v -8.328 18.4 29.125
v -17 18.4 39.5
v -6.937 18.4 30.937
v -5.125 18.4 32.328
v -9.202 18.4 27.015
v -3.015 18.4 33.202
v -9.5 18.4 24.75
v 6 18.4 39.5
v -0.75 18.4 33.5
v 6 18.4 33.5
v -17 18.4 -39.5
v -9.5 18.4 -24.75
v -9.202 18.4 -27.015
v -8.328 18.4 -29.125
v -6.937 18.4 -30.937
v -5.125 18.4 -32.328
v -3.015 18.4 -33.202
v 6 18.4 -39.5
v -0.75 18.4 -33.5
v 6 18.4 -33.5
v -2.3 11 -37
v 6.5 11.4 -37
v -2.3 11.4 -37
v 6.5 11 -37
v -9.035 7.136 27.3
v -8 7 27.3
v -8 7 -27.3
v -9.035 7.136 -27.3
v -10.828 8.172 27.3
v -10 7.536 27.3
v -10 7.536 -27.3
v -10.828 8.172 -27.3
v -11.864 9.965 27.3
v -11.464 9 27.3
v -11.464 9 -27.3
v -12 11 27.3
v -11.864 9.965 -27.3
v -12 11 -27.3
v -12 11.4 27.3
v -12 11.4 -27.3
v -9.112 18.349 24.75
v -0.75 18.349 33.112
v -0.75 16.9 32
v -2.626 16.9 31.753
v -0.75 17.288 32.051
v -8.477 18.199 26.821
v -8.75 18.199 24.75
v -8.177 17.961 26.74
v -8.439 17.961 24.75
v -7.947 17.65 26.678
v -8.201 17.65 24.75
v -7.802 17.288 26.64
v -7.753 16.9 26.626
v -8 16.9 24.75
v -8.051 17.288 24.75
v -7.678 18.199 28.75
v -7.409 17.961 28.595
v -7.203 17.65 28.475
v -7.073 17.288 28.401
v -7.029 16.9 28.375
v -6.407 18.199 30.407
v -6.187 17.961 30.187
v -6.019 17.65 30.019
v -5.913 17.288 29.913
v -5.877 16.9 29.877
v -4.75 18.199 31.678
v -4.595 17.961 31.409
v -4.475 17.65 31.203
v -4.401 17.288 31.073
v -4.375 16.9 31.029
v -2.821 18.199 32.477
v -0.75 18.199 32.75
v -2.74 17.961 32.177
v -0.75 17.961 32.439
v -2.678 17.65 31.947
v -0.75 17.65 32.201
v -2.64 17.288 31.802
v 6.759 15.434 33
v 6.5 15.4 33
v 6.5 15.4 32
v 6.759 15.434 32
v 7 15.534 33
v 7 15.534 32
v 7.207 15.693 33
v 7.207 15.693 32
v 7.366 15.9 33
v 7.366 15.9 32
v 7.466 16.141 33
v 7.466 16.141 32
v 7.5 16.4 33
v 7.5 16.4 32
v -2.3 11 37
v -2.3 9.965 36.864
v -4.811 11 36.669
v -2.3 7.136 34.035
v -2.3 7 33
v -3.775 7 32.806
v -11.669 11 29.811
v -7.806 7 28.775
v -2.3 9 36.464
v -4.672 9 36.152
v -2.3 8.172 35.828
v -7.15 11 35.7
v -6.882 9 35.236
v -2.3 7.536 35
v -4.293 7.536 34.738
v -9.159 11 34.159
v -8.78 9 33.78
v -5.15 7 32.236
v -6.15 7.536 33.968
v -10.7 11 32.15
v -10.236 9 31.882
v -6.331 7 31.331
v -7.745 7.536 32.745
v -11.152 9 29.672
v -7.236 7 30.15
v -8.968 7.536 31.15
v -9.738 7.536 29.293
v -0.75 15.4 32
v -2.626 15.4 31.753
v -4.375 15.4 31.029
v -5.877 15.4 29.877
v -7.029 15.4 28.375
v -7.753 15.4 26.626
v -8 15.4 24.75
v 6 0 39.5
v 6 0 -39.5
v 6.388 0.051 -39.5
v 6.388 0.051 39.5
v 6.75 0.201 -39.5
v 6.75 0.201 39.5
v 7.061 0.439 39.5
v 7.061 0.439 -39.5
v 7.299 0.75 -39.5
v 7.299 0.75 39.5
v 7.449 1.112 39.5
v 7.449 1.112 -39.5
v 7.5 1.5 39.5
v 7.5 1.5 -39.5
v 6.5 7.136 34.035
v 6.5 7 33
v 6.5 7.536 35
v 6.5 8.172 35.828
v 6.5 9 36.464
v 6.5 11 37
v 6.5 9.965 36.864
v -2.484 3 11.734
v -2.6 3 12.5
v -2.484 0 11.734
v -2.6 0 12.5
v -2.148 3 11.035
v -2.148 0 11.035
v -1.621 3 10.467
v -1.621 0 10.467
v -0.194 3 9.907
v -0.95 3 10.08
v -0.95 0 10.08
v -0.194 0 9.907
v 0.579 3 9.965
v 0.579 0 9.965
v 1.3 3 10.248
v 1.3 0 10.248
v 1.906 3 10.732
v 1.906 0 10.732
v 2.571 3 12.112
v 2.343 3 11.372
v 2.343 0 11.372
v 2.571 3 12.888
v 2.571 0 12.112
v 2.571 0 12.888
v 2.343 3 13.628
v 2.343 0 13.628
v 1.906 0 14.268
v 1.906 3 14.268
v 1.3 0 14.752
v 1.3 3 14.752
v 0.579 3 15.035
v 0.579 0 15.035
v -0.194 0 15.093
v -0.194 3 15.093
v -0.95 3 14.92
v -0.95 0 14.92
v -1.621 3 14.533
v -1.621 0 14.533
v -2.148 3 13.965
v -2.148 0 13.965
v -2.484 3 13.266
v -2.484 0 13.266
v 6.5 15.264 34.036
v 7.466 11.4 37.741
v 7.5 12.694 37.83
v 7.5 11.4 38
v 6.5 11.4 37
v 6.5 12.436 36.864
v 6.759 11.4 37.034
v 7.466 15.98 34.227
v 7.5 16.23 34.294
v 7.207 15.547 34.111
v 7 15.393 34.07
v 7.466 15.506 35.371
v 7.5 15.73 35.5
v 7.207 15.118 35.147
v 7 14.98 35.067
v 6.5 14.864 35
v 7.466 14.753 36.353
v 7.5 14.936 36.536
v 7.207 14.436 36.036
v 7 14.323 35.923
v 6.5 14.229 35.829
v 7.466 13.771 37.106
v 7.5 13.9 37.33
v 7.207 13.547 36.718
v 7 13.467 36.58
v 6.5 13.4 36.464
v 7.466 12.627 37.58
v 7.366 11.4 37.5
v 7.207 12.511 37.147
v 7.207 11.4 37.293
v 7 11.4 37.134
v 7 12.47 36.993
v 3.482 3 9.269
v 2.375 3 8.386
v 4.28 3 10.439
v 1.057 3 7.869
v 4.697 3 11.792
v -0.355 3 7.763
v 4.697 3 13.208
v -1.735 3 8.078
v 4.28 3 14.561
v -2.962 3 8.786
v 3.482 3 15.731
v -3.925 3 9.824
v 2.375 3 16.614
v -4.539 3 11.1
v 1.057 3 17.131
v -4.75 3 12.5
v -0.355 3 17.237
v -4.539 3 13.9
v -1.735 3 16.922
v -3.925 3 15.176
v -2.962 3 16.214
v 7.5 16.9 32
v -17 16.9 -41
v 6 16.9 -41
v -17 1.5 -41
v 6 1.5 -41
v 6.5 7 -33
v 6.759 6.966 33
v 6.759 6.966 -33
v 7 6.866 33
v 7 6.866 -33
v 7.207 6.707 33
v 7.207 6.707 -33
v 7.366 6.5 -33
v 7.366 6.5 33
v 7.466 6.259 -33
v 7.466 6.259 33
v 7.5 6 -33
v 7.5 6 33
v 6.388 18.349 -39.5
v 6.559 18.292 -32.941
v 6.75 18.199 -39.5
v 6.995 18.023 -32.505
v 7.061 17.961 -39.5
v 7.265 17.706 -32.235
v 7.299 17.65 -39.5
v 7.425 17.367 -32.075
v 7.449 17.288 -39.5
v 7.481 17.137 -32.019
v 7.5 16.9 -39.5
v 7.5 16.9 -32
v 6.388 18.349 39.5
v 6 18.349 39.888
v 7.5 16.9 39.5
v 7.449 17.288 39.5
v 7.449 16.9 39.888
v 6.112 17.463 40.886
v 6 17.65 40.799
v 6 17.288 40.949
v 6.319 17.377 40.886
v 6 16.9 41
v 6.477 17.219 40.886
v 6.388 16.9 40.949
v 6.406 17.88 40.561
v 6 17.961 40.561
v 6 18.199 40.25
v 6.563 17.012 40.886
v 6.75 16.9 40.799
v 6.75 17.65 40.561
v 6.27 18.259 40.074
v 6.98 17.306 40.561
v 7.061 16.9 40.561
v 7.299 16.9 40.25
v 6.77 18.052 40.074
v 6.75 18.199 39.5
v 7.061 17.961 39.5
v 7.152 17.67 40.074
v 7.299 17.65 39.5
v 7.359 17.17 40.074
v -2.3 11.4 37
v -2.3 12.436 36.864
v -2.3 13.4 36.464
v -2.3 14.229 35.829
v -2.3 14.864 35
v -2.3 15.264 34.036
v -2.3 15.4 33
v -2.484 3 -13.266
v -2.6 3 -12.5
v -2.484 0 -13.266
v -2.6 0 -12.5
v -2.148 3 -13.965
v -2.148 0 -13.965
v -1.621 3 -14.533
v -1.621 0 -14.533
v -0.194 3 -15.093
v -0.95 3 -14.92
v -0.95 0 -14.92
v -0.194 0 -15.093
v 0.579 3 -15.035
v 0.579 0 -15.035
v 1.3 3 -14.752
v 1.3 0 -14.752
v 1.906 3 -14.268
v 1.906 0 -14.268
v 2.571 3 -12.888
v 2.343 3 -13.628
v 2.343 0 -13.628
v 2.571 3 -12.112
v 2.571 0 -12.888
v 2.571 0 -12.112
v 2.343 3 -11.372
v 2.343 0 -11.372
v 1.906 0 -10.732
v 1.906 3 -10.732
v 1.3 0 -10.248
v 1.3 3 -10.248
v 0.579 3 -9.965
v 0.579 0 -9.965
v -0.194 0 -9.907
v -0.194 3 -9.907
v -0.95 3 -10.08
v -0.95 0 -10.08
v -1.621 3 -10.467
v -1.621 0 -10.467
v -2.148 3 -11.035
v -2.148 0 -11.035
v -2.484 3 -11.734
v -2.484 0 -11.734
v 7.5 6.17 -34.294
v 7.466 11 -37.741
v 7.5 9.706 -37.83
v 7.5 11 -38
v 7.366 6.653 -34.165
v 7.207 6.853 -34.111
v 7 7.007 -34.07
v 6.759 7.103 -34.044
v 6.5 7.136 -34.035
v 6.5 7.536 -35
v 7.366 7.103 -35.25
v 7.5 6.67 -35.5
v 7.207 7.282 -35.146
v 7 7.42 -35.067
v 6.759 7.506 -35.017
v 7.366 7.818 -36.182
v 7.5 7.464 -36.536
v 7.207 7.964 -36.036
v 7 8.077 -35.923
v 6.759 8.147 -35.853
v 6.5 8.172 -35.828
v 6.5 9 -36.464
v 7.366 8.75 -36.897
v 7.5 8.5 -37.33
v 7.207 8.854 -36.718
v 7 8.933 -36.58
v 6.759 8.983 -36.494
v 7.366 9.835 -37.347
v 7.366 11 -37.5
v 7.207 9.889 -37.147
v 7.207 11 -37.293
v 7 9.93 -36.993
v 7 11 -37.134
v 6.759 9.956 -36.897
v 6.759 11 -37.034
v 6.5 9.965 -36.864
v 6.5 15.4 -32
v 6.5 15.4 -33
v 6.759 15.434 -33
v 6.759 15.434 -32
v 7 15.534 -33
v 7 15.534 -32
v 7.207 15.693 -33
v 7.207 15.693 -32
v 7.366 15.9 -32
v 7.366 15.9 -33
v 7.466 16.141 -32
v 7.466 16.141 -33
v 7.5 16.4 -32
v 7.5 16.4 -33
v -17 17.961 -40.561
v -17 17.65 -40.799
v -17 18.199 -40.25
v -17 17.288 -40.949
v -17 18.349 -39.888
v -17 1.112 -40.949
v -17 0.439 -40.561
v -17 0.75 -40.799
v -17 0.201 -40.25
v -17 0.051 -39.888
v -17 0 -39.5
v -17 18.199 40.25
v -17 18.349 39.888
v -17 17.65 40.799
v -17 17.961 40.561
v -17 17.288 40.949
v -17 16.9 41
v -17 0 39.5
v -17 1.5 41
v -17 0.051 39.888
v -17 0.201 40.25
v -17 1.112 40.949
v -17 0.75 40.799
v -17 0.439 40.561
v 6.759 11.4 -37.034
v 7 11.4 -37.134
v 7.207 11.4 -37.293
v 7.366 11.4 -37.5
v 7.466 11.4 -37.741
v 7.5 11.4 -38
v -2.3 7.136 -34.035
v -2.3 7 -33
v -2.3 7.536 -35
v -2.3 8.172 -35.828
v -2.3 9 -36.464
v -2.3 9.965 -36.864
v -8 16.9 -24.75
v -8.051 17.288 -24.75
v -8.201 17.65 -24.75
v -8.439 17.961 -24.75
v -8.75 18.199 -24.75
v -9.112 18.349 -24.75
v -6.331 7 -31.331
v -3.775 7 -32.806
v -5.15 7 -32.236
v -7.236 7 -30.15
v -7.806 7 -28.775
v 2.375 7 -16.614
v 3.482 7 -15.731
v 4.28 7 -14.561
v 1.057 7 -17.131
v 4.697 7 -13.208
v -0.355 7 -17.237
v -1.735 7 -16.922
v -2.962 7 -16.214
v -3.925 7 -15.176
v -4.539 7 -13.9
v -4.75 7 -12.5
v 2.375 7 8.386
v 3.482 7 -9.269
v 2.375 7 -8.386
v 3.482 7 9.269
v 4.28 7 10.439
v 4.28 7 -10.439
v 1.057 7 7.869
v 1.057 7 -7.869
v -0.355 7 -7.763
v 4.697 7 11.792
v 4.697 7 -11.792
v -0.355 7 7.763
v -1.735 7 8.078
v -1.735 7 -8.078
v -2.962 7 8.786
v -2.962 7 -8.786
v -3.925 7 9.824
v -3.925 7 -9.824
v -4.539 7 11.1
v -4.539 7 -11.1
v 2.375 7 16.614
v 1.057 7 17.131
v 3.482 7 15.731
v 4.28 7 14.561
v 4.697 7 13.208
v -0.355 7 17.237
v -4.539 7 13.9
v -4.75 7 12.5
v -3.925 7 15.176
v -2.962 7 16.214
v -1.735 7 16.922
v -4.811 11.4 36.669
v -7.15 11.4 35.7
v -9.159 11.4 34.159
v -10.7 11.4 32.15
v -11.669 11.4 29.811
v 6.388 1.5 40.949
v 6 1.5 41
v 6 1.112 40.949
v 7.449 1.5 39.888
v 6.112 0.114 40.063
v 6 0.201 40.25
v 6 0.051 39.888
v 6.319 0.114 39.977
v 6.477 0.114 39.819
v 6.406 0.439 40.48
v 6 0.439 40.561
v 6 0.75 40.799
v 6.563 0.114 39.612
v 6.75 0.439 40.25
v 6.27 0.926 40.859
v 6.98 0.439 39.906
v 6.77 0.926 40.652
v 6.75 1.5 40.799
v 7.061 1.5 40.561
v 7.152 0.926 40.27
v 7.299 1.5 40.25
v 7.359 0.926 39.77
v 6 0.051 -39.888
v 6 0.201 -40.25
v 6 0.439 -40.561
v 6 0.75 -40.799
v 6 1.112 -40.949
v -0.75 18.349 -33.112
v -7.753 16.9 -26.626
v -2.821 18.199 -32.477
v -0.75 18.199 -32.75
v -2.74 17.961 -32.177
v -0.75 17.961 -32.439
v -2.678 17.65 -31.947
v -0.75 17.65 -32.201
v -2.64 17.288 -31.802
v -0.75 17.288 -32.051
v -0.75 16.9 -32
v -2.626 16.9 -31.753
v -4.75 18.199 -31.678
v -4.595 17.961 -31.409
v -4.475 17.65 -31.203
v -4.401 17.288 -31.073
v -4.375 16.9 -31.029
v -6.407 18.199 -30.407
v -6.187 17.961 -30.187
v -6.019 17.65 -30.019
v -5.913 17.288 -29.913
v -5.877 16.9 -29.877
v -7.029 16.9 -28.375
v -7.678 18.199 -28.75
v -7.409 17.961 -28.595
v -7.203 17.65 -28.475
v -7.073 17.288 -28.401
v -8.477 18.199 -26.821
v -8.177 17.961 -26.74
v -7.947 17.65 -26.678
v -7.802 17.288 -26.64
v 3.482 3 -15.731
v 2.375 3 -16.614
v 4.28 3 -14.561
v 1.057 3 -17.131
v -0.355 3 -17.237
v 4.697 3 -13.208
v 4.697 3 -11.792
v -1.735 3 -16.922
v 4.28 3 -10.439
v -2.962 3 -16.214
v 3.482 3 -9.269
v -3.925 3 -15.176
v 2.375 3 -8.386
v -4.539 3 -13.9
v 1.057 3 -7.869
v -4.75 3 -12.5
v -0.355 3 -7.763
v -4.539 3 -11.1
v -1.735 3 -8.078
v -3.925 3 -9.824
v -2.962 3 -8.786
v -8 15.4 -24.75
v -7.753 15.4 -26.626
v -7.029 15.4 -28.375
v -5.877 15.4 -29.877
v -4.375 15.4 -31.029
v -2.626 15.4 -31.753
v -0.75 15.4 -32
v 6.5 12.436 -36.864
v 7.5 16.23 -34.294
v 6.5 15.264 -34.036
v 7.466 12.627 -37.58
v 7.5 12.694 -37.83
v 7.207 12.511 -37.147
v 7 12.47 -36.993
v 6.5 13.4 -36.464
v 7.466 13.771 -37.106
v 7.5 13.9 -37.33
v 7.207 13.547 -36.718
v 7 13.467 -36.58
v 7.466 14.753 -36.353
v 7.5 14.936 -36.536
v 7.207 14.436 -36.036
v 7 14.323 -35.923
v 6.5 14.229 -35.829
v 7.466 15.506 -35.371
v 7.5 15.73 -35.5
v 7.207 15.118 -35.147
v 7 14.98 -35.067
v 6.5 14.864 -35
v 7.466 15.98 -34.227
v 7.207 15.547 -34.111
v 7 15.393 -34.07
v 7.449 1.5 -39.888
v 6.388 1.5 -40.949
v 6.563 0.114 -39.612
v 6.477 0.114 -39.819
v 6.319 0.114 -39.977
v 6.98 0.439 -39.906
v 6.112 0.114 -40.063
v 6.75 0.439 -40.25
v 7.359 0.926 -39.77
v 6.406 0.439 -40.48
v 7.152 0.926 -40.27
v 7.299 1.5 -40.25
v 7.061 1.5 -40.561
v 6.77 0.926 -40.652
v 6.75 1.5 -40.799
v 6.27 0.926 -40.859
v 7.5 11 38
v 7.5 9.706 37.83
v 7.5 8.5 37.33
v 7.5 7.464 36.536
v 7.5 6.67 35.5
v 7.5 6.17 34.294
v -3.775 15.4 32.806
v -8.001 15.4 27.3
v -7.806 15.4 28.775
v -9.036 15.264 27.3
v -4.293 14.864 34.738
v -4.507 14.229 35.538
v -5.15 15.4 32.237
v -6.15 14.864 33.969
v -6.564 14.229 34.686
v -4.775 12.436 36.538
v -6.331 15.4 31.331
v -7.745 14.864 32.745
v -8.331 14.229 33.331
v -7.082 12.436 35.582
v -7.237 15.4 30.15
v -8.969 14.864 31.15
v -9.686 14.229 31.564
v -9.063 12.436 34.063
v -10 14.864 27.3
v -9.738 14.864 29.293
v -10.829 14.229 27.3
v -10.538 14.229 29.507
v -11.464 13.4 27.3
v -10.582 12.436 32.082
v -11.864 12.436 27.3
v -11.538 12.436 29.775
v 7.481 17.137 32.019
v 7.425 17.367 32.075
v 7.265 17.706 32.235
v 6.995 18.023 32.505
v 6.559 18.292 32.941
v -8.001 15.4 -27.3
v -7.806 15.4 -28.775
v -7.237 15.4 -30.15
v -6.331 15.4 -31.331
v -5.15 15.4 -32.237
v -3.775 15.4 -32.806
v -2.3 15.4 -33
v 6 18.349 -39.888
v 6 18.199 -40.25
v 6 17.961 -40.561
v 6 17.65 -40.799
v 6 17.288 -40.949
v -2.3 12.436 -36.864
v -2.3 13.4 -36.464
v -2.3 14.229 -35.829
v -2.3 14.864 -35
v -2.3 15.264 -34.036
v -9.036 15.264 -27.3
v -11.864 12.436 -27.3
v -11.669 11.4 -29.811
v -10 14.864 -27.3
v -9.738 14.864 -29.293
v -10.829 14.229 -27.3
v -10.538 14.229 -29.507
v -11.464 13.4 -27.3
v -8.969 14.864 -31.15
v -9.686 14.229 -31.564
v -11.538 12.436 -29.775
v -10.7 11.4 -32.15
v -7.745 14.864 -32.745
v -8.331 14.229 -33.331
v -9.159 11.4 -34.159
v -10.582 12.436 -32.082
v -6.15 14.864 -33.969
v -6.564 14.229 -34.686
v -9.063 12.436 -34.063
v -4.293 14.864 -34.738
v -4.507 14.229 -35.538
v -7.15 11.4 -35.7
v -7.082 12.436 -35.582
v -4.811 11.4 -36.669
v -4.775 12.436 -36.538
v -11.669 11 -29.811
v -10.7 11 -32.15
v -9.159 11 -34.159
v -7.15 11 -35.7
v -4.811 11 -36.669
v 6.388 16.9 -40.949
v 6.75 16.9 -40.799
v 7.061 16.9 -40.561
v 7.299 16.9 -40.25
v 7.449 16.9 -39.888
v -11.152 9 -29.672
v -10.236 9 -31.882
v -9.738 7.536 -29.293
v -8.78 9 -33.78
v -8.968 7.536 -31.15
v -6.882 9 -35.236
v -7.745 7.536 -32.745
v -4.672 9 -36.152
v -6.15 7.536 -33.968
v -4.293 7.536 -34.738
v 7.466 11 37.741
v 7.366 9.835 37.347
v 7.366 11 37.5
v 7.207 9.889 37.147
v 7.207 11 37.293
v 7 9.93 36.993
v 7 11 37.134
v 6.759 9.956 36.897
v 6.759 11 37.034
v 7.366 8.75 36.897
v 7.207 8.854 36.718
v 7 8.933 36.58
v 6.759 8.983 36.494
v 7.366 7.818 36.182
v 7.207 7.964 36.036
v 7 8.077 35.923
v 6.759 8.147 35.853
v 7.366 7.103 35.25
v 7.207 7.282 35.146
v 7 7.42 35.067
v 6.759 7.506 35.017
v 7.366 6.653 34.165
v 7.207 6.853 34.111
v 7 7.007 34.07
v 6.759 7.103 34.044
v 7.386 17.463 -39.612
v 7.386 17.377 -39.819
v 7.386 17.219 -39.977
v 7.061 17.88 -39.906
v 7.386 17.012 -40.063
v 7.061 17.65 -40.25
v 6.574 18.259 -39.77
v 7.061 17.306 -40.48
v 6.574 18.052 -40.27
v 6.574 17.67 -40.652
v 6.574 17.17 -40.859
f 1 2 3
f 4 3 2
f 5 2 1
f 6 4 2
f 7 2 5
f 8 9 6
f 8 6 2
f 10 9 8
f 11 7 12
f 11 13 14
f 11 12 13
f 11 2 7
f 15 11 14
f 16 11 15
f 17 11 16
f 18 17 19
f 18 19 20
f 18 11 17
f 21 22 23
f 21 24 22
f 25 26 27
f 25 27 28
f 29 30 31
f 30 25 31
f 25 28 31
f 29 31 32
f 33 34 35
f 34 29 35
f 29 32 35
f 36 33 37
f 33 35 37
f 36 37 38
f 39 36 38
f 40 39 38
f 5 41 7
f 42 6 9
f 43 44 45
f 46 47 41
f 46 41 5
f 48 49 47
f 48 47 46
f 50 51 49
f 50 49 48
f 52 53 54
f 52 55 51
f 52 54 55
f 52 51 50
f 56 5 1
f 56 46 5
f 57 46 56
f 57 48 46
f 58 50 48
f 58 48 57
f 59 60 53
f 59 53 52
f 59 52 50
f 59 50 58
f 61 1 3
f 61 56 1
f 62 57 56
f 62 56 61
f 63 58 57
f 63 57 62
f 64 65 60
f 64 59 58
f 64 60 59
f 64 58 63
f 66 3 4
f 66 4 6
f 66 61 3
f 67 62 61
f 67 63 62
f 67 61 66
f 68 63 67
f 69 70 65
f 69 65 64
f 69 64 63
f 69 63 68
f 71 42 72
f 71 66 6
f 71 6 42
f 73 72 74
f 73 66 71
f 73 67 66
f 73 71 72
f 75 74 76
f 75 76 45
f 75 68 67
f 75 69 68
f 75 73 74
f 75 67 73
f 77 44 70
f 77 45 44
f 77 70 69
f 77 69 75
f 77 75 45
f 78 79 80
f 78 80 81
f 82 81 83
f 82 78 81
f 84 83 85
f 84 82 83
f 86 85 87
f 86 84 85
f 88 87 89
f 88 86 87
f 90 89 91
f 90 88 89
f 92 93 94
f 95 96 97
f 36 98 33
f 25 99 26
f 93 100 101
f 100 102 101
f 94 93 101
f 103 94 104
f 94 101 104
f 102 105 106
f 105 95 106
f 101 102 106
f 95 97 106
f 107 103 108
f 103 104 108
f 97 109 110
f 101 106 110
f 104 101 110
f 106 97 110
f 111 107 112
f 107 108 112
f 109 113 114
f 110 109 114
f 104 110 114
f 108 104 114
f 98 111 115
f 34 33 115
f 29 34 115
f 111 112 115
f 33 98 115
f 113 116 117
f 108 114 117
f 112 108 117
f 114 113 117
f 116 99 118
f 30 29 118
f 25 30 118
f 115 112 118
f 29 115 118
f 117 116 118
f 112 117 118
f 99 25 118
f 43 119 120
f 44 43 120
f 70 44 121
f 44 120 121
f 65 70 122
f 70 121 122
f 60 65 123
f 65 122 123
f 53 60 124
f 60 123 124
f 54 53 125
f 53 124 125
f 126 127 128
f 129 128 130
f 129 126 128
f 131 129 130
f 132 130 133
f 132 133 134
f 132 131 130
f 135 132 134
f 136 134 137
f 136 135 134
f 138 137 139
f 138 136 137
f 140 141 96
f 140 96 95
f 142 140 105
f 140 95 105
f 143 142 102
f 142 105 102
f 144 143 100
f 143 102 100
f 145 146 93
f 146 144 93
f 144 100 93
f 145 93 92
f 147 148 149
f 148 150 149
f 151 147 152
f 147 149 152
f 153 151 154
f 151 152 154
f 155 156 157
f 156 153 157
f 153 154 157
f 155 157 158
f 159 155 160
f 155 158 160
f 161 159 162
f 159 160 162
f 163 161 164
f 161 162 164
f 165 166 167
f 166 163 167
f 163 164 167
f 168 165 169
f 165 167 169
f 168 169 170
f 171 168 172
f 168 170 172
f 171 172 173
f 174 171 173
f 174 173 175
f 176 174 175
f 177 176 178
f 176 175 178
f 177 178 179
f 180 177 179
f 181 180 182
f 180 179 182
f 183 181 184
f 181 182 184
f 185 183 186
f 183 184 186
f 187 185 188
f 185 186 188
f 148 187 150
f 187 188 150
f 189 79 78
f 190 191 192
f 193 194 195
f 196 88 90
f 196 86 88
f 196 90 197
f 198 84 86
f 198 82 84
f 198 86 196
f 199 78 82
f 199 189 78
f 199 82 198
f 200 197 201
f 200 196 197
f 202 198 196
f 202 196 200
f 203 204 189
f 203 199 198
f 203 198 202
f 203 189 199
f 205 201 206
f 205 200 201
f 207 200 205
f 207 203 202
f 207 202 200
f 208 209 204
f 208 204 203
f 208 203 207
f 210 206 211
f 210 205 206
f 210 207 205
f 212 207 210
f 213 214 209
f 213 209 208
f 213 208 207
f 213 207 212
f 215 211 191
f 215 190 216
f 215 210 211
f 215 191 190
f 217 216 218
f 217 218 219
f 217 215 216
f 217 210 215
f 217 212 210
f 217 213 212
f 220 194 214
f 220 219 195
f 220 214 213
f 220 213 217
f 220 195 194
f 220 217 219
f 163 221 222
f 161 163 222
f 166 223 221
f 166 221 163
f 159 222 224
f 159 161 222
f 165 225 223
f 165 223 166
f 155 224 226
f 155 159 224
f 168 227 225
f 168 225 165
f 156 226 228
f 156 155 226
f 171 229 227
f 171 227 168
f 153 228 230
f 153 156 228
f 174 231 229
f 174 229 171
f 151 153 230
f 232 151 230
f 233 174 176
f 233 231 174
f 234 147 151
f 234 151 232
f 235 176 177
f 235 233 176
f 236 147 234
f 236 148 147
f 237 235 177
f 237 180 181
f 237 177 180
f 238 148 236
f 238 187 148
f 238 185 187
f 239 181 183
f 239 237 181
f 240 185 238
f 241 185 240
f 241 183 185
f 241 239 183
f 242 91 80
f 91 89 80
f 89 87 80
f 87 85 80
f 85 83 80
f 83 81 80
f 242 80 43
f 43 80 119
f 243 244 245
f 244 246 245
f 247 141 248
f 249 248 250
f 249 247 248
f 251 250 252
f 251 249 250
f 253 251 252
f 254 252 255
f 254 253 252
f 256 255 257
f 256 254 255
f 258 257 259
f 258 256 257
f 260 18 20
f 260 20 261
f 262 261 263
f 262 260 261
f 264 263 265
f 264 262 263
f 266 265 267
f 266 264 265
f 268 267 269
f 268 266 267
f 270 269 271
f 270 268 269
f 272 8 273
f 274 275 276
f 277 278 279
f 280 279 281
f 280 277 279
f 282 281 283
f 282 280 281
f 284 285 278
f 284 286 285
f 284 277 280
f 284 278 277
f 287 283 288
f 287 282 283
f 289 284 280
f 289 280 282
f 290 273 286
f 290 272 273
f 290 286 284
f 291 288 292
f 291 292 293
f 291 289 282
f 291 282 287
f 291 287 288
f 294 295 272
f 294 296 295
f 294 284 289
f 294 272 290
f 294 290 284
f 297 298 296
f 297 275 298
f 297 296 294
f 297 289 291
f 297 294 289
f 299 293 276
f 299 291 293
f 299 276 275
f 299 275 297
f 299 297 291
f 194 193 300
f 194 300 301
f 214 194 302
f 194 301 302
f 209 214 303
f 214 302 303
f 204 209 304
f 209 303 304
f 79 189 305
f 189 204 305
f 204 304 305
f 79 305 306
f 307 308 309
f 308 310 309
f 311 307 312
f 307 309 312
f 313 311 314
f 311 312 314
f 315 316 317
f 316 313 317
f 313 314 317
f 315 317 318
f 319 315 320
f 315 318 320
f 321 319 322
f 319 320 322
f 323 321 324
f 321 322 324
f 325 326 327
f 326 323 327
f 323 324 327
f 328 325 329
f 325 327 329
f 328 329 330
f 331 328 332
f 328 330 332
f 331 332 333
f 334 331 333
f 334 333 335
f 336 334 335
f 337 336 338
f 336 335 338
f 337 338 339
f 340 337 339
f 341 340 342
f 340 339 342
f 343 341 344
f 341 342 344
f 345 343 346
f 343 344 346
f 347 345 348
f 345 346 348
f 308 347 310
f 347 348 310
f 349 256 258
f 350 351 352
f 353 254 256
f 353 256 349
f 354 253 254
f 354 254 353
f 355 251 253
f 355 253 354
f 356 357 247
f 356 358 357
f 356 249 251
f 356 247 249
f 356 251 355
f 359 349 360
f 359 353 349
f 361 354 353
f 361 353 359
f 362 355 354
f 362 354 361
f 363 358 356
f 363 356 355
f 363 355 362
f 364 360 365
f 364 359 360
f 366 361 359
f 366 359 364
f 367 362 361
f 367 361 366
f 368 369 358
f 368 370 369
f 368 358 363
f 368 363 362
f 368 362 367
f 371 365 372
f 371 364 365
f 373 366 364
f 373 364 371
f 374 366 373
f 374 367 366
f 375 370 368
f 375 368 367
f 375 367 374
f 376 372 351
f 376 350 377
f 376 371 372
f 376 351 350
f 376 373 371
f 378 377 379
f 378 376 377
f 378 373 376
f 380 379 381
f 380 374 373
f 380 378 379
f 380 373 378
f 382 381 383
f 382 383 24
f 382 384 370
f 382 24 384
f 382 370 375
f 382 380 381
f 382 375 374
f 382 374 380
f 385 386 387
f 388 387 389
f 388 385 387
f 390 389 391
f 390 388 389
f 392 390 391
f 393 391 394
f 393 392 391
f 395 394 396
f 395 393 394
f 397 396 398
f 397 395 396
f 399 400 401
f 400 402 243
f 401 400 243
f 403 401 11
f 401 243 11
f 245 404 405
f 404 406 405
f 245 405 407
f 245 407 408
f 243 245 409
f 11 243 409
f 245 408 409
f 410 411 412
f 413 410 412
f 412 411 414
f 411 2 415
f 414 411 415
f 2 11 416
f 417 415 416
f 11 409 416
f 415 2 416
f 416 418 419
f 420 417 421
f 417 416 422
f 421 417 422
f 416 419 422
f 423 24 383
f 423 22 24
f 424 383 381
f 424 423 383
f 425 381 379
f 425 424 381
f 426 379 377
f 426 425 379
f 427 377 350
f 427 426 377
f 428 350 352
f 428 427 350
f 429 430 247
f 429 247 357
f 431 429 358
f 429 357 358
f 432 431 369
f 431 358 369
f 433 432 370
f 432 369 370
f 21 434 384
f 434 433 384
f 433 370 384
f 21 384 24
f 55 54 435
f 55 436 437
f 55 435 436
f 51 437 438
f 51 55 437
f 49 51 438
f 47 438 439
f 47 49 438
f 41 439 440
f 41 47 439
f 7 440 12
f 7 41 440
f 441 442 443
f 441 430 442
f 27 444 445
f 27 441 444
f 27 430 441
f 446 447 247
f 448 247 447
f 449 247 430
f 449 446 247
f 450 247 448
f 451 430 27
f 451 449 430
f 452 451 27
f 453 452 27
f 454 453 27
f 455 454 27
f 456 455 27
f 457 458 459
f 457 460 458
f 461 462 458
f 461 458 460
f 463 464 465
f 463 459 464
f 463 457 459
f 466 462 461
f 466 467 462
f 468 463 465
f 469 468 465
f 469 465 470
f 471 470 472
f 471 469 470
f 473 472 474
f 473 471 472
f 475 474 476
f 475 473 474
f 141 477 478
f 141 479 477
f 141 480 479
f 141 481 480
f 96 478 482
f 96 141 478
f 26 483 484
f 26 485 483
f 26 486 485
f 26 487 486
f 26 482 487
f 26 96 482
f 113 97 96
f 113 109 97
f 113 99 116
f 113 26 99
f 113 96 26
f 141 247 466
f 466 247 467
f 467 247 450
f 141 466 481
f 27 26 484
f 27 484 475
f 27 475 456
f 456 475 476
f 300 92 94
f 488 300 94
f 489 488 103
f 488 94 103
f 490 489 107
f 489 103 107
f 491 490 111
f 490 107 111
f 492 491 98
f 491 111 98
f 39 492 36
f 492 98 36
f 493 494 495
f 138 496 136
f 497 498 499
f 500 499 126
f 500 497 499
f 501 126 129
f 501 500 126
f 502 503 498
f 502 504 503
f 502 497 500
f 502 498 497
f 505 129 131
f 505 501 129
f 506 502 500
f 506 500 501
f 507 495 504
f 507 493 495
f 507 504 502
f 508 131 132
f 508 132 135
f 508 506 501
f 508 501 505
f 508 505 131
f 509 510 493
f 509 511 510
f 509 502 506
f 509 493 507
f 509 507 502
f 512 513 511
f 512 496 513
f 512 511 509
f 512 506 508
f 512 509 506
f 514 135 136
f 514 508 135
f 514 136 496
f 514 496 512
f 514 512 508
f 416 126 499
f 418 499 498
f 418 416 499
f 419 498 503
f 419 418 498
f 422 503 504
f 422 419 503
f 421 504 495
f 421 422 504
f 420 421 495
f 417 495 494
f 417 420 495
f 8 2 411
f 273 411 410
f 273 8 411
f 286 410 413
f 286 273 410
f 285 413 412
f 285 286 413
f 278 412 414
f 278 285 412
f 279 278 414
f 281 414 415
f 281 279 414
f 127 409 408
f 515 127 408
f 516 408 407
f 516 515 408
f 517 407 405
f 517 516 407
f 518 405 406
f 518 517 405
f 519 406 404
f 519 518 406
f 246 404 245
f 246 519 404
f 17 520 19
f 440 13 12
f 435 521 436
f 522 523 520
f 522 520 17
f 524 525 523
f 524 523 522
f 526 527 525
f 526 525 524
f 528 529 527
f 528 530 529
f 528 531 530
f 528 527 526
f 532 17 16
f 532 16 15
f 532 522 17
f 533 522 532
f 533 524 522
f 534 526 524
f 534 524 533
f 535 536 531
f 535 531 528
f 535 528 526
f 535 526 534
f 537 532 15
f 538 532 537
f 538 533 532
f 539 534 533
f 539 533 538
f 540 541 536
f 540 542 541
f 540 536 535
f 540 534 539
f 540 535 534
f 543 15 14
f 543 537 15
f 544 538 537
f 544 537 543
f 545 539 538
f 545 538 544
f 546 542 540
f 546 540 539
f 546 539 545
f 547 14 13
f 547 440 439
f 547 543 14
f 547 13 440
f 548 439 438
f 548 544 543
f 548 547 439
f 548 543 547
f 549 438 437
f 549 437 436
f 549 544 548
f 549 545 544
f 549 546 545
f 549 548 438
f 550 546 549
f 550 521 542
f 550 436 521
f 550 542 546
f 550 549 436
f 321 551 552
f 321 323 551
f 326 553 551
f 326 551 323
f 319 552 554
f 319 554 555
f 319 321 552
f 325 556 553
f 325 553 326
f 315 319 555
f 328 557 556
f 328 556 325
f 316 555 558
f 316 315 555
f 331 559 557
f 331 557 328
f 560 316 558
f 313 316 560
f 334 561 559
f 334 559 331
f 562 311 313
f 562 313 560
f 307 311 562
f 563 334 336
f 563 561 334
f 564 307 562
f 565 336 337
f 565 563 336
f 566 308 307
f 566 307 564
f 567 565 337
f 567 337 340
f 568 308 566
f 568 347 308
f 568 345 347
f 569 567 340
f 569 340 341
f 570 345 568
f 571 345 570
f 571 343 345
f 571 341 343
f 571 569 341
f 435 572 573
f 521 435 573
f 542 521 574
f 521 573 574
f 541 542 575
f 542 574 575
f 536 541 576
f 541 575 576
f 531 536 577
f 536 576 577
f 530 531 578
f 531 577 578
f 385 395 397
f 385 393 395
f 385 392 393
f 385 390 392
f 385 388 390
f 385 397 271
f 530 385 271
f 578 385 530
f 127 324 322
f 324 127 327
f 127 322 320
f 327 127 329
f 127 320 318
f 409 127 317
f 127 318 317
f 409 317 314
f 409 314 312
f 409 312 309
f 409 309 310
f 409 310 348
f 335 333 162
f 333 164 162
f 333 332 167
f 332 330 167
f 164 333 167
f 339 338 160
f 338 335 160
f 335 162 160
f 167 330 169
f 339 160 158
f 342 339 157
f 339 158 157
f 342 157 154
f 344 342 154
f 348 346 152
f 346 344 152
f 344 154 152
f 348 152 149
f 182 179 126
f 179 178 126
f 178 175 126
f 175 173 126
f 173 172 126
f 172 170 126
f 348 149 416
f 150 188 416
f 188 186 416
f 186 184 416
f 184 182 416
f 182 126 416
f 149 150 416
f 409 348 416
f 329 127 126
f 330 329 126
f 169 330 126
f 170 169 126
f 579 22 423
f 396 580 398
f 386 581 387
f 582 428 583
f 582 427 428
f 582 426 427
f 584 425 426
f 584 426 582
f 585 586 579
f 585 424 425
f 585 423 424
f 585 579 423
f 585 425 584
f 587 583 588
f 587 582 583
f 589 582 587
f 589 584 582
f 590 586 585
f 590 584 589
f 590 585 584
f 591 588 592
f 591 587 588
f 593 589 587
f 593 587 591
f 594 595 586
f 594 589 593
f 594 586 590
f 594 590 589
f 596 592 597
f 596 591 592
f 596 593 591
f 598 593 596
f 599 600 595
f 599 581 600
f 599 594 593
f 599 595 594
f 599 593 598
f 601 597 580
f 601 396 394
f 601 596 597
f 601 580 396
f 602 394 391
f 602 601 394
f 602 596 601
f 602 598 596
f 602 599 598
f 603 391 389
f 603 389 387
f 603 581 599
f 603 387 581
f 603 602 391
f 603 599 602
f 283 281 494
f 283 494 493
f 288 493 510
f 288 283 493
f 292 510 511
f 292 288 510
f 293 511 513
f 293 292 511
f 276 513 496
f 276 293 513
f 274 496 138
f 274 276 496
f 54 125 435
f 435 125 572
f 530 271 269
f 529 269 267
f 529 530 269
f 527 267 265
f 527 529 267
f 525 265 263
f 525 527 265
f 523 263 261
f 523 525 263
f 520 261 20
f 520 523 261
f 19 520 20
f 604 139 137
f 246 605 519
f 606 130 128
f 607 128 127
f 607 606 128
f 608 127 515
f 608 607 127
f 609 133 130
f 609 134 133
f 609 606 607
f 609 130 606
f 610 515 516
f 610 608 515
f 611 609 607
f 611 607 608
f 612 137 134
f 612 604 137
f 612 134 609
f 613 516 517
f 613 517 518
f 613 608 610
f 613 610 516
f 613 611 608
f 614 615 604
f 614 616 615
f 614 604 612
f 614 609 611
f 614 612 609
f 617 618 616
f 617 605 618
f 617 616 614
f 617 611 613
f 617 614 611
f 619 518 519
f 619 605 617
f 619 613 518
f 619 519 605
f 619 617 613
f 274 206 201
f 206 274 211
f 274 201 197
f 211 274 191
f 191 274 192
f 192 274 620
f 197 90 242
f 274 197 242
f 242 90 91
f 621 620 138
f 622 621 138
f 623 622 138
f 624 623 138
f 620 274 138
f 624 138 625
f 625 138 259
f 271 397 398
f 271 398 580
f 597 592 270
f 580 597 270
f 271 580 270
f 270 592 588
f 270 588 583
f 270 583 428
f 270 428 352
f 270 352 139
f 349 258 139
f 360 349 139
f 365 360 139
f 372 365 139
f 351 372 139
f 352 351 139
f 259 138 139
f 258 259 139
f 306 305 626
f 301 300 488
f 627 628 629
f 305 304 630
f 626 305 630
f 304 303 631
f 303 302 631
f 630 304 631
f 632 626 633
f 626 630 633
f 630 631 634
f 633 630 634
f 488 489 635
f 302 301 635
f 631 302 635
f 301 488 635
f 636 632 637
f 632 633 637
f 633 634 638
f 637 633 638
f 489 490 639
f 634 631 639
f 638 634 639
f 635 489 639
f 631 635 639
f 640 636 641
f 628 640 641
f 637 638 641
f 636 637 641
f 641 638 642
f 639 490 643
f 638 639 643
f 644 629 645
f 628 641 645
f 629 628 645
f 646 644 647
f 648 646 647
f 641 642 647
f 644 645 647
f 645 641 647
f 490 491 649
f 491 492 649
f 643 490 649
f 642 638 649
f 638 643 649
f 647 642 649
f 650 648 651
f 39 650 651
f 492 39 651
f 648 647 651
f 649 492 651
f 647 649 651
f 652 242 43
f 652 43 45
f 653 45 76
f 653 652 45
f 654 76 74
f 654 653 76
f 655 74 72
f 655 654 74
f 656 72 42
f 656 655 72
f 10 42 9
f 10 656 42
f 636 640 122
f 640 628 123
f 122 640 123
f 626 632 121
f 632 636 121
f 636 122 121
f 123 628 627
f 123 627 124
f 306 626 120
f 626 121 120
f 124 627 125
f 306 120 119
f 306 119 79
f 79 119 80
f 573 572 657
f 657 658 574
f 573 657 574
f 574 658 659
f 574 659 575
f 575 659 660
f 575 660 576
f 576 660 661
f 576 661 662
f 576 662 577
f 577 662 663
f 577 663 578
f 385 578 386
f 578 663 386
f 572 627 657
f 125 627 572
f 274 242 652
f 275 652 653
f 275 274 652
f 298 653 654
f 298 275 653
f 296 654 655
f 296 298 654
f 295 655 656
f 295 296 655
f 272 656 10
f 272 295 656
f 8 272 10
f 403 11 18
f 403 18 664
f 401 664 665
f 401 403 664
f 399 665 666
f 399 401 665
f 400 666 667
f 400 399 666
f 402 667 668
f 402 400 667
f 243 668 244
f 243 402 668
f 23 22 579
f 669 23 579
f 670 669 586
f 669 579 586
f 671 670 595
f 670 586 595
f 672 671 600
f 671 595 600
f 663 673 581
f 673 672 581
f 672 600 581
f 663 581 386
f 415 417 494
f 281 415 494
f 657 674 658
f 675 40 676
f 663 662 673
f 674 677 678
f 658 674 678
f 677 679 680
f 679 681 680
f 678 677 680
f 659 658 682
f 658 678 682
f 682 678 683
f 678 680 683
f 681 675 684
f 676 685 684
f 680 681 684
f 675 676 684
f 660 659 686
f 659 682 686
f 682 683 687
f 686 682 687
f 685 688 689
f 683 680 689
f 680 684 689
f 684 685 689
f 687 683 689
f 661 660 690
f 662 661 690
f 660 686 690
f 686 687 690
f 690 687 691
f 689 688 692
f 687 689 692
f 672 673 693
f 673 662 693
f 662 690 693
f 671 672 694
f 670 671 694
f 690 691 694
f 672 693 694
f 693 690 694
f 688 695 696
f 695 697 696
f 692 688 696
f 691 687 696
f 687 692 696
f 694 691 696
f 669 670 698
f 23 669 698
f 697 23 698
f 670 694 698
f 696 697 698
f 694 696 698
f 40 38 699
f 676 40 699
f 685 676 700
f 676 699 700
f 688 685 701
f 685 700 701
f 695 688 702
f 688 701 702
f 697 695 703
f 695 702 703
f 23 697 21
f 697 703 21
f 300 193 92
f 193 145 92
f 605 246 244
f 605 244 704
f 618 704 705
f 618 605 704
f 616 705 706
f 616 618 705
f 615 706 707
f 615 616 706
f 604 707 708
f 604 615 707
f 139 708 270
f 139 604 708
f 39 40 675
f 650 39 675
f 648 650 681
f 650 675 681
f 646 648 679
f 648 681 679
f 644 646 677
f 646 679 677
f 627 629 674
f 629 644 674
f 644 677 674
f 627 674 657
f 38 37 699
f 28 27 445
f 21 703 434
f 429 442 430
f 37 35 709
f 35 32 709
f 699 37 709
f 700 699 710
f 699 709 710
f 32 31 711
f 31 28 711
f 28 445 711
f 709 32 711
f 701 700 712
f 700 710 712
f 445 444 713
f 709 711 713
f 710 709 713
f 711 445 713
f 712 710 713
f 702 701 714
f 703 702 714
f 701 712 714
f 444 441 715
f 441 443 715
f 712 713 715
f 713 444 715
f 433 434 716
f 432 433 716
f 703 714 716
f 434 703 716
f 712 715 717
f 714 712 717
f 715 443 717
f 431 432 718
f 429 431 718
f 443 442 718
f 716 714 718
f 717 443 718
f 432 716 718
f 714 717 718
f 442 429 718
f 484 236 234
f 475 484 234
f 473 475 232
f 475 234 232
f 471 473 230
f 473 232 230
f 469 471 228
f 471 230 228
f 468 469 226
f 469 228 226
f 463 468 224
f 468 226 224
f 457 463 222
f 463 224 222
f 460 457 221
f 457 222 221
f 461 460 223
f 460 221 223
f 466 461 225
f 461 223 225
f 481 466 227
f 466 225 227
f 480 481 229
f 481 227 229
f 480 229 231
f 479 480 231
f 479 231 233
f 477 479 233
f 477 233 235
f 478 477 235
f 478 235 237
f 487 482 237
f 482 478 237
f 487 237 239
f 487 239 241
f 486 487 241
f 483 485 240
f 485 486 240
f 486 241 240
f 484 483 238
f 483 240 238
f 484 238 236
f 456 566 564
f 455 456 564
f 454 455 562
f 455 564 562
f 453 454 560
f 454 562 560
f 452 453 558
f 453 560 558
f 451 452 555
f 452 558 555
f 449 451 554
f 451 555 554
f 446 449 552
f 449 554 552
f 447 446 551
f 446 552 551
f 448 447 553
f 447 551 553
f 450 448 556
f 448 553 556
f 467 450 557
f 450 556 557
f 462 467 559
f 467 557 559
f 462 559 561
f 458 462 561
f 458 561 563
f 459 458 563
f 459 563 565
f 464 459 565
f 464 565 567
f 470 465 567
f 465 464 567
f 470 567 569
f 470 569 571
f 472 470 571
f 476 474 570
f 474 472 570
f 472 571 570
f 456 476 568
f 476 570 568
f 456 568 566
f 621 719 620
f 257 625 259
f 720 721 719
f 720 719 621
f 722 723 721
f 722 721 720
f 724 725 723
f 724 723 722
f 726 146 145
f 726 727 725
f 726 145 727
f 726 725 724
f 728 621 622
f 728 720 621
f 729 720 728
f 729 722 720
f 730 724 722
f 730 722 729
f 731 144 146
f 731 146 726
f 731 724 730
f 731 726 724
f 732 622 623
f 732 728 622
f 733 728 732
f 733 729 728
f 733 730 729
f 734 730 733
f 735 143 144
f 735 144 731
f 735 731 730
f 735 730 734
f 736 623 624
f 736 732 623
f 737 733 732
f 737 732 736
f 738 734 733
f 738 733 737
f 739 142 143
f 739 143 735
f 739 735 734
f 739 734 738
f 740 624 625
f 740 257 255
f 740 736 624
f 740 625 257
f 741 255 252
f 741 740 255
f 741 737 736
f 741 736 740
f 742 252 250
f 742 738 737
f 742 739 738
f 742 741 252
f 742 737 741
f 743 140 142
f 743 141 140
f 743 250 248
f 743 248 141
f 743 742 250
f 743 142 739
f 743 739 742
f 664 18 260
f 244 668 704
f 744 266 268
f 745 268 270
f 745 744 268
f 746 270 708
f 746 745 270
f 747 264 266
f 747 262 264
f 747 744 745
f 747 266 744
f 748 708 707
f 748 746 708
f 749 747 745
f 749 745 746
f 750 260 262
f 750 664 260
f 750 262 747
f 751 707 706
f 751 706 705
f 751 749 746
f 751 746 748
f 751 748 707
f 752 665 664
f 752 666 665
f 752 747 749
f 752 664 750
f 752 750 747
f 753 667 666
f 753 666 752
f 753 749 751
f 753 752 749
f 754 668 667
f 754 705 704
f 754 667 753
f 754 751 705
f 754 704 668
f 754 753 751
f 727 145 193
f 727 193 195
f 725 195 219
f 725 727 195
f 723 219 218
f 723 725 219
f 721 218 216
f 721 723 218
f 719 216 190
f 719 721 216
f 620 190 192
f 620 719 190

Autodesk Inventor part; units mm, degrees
ref_plane "YZ Plane" through (0, 0, 0) normal (1, 0, 0) x (0, 1, 0)
ref_plane "XZ Plane" through (0, 0, 0) normal (0, 1, 0) x (-1, 0, 0)
ref_plane "XY Plane" through (0, 0, 0) normal (0, 0, 1) x (1, 0, 0)
sketch "Sketch1" plane through (0, 0, 0) normal (0, 1, 0) x (-1, 0, 0)
  circle A0 centre (0, 12.5) radius 2.6
  circle A1 centre (0, -12.5) radius 2.6
  circle A2 centre (0, 12.5) radius 4.75
  circle A3 centre (0, -12.5) radius 4.75
  circle A4 centre (0, 12.5) radius 7.5
  circle A5 centre (0, -12.5) radius 7.5
  line L0 (7.5, 12.5) -> (7.5, -12.5)
  line L1 (-7.5, -12.5) -> (-7.5, 12.5)
  line L2 (0, 12.5) -> (0, -12.5) construction
  line L3 (7.5, -12.5) -> (7.5, 12.5)
  line L4 (-7.5, 41) -> (17, 41)
  line L5 (17, 41) -> (17, -41)
  line L6 (17, -41) -> (-7.5, -41)
  line L7 (-7.5, -41) -> (-7.5, 41)
  point P0 (0, 0)
  point P1 (7.5, -41)
  dimension "d0" = 5.2
  dimension "d1" = 5.2
  dimension "d2" = 25
  dimension "d3" = 12.5
  dimension "d6" = 9.5
  dimension "d7" = 9.5
  dimension "d8" = 15
  dimension "d9" = 15
  dimension "d19" = 24.5
  dimension "d20" = 82
  dimension "d21" = 41
extrude "Extrusion1" add sketch "Sketch1" along normal blind 3 contours A2 | A3
extrude "Extrusion2" add sketch "Sketch1" along normal blind 7 contours A4 | L0 A5 L1 A4 | A4 L7 L4 L5 L6 A5 L0 | A5
sketch "Sketch2" plane through (0, 7, 0) normal (0, 1, 0) x (1, 0, 0)
  circle A0 centre (0, 12.5) radius 4.75 projected
  circle A1 centre (0, -12.5) radius 4.75 projected
  line L0 (-17, -41) -> (7.5, -41) projected
  line L1 (7.5, -41) -> (7.5, 41) projected
  line L2 (7.5, 41) -> (-17, 41) projected
  line L3 (-17, 41) -> (-17, -41) projected
  line L4 (7.5, 41) -> (7.5, -41) projected
  line L5 (7.5, -37) -> (-2.3, -37)
  line L6 (-12, -27.3) -> (-12, 27.3)
  line L7 (7.5, 37) -> (-2.3, 37)
  arc A2 (-12, -27.3) -> (-2.3, -37) centre (-2.3, -27.3) ccw
  arc A3 (-2.3, 37) -> (-12, 27.3) centre (-2.3, 27.3) ccw
  point P0 (0, 0)
  dimension "d23" = 5
  dimension "d24" = 4
  dimension "d25" = 4
  dimension "d26" = 9.7
extrude "Extrusion3" add sketch "Sketch2" along normal blind 8.4 contours L3 L2 L1 L7 A3 L6 A2 L5 L0
sketch "Sketch3" plane through (0, 15.4, 0) normal (0, 1, 0) x (1, 0, 0)
  line L0 (7.5, -41) -> (7.5, -37) projected
  line L1 (7.5, -37) -> (-2.3, -37) projected
  arc A0 (-12, -27.3) -> (-2.3, -37) centre (-2.3, -27.3) ccw projected
  line L2 (-12, -27.3) -> (-12, 27.3) projected
  arc A1 (-2.3, 37) -> (-12, 27.3) centre (-2.3, 27.3) ccw projected
  line L3 (-2.3, 37) -> (7.5, 37) projected
  line L4 (7.5, 37) -> (7.5, 41) projected
  line L5 (7.5, 41) -> (-17, 41) projected
  line L6 (-17, 41) -> (-17, -41) projected
  line L7 (-17, -41) -> (7.5, -41) projected
  line L8 (7.5, -37) -> (7.5, 37) projected
  line L9 (7.5, -32) -> (-0.75, -32)
  line L10 (7.5, 32) -> (-0.75, 32)
  line L11 (-8, -24.75) -> (-8, 24.75)
  arc A2 (-8, -24.75) -> (-0.75, -32) centre (-0.75, -24.75) ccw
  arc A3 (-0.75, 32) -> (-8, 24.75) centre (-0.75, 24.75) ccw
  line L12 (7.5, -32) -> (7.5, -37)
  line L13 (7.5, 32) -> (7.5, 37)
  point P0 (0, 0)
  dimension "d29" = 64
  dimension "d30" = 32
  dimension "d31" = 4
  dimension "d32" = 7.25
extrude "Extrusion4" add sketch "Sketch3" along normal blind 3 contours L7 L6 L5 L4 L3 A1 L2 A0 L1 L0 | L1 A0 L2 A1 L3 L8 L10 A3 L11 A2 L9
fillet "Fillet1" radius 4 5 edges at (2.6, 7, 37) (-12, 7, 0) (-9.1589, 7, -34.1589) (2.6, 7, -37) (-9.1589, 7, 34.1589)
fillet "Fillet2" radius 4 5 edges at (-12, 15.4, 0) (-9.1589, 15.4, -34.1589) (2.6, 15.4, -37) (2.6, 15.4, 37) (-9.1589, 15.4, 34.1589)
fillet "Fillet3" radius 1 3 edges at (7.5, 7, 0) (7.5, 8.1716, -35.8284) (7.5, 8.1716, 35.8284)
fillet "Fillet4" radius 1.5 14 edges at (-5.8765, 18.4, 29.8765) (-8, 18.4, 0) (-5.8765, 18.4, -29.8765) (3.375, 18.4, -32) (3.375, 18.4, 32) (7.5, 18.4, 36.5) (-4.75, 18.4, -41) (-4.75, 18.4, 41) (7.5, 18.4, -36.5) (7.5, 9.2, -41) (7.5, 9.2, 41) (-4.75, 0, 41) (7.5, 0, 0) (-4.75, 0, -41)
equation "\"d3\" = 0.5 * d2"
equation "\"d21\" = 0.5 * d20"
equation "\"d30\" = 0.5 * d29"
properties part number "HolderFront"
